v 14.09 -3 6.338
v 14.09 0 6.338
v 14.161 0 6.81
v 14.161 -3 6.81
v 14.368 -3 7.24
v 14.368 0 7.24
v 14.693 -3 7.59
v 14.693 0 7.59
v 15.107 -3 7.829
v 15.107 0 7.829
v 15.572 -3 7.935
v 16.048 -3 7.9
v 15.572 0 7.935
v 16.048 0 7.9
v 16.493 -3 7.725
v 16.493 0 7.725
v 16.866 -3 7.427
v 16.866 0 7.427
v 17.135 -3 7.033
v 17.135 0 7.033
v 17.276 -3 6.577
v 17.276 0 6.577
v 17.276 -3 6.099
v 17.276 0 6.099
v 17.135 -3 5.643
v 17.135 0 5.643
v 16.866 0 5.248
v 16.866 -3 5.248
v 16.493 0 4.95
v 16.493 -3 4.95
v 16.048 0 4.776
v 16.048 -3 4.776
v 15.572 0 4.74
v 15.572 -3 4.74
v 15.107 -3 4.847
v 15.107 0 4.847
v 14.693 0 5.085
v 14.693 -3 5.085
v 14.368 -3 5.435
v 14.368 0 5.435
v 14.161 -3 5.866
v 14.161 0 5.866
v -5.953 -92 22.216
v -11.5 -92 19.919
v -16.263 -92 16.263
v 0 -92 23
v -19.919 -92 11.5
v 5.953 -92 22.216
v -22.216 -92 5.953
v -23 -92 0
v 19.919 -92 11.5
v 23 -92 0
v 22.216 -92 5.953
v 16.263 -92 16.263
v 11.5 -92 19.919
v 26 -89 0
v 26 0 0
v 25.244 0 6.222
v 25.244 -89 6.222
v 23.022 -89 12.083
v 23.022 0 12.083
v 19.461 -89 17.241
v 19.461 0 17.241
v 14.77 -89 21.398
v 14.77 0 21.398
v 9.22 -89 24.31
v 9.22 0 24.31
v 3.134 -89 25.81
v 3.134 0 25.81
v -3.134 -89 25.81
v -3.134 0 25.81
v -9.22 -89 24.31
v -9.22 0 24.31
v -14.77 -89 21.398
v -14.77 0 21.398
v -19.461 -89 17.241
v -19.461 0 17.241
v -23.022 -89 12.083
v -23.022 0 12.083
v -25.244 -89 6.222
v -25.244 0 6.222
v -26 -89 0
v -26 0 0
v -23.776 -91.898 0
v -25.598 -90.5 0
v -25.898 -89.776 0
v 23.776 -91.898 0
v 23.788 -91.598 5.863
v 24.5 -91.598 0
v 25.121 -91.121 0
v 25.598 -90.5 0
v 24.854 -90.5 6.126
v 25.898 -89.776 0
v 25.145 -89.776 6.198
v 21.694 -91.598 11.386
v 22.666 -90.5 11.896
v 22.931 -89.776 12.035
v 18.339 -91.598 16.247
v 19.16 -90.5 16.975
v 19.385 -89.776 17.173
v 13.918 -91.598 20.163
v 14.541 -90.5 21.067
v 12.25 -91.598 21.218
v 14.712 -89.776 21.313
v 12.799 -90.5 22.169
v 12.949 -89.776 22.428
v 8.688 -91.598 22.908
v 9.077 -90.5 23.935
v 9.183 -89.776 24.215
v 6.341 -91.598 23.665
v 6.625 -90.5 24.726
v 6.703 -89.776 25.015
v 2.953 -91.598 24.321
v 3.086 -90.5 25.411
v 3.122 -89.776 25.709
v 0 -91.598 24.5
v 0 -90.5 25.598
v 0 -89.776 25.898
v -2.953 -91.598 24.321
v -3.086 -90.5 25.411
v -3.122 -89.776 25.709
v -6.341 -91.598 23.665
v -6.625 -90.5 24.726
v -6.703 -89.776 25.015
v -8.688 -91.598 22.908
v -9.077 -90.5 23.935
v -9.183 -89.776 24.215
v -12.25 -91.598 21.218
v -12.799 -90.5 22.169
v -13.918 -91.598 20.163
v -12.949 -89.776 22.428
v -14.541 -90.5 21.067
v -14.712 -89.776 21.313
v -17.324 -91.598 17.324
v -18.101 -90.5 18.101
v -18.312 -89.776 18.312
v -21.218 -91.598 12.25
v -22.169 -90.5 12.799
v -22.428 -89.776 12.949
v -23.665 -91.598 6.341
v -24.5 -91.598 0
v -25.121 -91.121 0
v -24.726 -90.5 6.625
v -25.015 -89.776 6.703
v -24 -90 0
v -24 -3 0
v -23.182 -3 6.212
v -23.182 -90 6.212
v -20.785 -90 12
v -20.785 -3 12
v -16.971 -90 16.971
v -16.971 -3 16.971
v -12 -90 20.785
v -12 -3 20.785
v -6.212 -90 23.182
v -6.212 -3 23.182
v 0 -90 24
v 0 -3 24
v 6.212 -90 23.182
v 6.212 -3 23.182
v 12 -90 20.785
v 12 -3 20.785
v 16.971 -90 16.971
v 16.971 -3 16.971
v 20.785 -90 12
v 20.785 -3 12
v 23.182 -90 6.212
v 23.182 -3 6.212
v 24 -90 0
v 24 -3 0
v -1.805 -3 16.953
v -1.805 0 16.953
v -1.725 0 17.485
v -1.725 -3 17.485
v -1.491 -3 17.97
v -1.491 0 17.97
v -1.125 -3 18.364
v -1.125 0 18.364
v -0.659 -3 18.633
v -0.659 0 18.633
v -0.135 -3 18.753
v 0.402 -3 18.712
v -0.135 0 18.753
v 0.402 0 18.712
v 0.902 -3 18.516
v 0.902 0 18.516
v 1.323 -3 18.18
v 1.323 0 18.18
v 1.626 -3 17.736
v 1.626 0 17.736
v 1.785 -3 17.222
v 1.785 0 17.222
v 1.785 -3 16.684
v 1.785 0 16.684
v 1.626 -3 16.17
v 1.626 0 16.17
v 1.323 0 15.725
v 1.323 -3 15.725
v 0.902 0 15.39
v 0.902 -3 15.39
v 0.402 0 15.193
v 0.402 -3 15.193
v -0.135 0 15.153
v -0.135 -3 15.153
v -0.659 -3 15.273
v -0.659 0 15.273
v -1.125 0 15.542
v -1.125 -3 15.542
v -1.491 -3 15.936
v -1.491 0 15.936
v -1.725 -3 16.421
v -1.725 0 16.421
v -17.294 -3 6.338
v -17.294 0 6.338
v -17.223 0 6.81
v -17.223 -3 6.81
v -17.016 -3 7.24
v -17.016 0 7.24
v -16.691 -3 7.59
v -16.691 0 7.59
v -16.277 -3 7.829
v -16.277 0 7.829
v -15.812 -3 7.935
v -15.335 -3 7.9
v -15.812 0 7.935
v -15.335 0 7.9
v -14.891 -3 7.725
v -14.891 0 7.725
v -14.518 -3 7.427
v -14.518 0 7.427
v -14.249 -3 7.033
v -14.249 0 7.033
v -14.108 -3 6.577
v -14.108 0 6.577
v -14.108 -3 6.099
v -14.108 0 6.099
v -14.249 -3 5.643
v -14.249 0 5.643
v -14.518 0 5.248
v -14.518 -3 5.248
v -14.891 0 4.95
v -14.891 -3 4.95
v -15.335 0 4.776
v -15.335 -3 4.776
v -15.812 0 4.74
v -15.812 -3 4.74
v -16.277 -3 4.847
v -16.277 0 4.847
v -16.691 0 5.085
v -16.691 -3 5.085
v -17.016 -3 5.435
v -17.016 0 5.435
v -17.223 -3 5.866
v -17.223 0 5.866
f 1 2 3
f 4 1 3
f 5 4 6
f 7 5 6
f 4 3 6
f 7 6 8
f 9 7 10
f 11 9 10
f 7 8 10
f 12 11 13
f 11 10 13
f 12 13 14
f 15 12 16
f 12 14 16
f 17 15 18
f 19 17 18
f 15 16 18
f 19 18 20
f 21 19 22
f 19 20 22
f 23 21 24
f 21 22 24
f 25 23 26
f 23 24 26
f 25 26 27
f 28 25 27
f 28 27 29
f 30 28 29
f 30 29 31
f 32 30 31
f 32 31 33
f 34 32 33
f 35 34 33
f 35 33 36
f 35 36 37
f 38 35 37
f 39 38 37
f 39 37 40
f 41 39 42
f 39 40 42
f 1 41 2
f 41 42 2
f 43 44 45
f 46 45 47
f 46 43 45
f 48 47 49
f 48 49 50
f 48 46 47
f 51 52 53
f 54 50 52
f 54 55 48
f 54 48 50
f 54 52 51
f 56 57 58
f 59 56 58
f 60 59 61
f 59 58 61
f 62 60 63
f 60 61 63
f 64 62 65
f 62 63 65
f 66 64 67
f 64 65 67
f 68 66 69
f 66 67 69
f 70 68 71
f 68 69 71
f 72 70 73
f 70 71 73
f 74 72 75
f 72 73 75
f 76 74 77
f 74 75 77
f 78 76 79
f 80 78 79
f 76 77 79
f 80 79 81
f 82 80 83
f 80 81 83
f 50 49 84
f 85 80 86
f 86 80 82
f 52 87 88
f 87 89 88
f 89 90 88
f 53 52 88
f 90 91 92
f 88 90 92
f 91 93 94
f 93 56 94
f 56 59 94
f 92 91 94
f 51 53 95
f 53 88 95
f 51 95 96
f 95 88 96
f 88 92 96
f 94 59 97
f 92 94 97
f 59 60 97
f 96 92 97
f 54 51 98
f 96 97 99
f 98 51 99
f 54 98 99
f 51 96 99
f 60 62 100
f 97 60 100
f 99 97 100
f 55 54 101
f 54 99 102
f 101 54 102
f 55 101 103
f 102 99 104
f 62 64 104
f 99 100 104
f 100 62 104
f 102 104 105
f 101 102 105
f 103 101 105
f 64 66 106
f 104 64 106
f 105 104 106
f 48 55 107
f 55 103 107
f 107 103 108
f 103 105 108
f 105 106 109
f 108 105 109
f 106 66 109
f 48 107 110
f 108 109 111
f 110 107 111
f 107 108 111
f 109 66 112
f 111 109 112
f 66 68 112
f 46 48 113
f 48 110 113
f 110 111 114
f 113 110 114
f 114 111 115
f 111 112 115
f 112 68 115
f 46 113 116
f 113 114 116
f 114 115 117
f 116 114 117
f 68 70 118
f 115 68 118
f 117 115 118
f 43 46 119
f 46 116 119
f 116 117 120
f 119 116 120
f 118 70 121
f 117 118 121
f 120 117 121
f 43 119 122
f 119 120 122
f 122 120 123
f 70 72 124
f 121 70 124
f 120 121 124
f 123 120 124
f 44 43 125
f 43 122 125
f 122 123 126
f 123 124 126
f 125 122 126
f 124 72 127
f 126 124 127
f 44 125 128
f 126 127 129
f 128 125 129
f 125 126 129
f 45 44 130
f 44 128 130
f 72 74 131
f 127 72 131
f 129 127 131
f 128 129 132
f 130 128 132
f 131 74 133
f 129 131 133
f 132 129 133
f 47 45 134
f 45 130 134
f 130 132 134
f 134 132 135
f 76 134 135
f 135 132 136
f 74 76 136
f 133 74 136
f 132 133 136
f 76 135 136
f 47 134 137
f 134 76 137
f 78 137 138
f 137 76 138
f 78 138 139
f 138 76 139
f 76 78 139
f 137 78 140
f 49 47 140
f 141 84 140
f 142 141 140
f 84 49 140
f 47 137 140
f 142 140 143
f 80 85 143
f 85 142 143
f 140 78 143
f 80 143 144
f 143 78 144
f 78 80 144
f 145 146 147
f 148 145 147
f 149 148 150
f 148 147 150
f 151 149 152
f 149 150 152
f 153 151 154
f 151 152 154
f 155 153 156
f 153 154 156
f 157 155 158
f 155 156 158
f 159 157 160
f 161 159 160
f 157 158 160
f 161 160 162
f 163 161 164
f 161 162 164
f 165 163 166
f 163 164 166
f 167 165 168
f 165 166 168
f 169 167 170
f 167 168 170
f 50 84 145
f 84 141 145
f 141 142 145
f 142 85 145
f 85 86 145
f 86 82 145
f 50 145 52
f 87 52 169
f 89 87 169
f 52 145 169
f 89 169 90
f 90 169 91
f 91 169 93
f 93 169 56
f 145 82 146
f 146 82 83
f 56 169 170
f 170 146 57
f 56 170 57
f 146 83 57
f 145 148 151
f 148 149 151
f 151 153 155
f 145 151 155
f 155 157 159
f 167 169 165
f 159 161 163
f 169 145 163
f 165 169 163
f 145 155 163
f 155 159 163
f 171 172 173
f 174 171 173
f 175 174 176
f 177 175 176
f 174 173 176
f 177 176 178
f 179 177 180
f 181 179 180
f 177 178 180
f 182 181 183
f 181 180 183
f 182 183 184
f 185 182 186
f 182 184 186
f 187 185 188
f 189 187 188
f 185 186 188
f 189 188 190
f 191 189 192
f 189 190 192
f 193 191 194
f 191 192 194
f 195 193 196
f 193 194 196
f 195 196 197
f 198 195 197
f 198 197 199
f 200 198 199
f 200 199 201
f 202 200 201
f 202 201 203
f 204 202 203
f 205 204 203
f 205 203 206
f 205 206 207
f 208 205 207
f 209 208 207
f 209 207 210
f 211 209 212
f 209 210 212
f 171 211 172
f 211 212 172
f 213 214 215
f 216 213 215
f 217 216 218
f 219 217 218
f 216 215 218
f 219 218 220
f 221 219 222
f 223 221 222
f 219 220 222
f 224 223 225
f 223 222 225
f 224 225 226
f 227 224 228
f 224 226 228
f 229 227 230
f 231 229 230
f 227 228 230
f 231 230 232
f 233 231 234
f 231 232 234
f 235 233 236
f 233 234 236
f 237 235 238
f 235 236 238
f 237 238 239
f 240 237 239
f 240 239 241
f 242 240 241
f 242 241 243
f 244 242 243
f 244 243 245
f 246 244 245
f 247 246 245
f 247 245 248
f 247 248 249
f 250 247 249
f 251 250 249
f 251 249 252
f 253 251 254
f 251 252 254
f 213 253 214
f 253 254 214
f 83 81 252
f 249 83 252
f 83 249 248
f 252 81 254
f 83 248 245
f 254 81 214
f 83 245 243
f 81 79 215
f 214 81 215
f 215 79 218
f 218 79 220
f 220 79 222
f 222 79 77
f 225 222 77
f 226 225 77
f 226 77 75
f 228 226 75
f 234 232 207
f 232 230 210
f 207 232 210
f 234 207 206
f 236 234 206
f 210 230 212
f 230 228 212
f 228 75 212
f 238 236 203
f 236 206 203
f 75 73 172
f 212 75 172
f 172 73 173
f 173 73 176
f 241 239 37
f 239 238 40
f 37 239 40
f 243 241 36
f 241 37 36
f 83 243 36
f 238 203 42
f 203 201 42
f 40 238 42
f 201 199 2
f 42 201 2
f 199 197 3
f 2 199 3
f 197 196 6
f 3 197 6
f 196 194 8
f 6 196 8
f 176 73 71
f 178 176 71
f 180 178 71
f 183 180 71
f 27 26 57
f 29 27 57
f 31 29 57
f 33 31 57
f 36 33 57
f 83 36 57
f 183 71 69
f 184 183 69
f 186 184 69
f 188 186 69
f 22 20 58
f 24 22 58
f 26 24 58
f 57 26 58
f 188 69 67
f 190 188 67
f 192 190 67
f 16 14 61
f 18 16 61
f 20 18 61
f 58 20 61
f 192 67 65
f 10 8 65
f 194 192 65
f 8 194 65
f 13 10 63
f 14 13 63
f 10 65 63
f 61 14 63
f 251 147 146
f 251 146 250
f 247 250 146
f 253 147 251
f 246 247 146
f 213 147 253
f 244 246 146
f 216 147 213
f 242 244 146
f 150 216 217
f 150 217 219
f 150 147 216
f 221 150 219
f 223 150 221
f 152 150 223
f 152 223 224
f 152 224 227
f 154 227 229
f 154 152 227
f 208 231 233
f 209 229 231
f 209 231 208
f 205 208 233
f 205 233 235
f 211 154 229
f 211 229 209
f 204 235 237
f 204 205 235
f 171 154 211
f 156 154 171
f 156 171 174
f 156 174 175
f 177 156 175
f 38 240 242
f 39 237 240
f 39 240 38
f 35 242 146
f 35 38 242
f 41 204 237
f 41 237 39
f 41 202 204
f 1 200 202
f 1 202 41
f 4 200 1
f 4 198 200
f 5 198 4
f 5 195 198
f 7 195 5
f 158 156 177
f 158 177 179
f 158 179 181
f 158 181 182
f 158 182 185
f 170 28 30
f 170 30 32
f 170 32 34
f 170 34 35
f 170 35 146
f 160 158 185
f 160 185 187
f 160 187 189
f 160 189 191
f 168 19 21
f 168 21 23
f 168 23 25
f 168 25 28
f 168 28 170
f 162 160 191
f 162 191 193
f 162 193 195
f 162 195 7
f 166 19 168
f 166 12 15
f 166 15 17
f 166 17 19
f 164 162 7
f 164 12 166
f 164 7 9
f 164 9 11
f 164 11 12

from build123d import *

# Parameters (mm, degrees)
F1_DEPTH = 90
F3_DEPTH = 2
F4_R     = 3
F6_DEPTH = 3
F7_R     = 1.804785
F7_R_2   = 1.602006
F8_DEPTH = 3


with BuildPart() as f1:
    # F0 (on Front) → F1 (new body)
    with BuildSketch(Plane.XZ):
        with BuildLine():
            Line((24, 0), (26, 0))
            ThreePointArc((26, 0), (0, 26), (-26, 0))
            Line((-26, 0), (-24, 0))
            ThreePointArc((-24, 0), (0, 24), (24, 0))
        make_face()
    extrude(amount=F1_DEPTH)

    # F2 (on face) → F3 (join)
    with BuildSketch(Plane.XZ.offset(90)):
        with BuildLine():
            Line((-26, 0), (26, 0))
            ThreePointArc((26, 0), (0, 26), (-26, 0))
        make_face()
    extrude(amount=F3_DEPTH)

    # F4
    f4_edges = [f1.edges().sort_by_distance(p)[0] for p in [
        (0, -92, 26),
    ]]
    fillet(f4_edges, radius=F4_R)

    # F5 (on Front) → F6 (join)
    with BuildSketch(Plane.XZ):
        with BuildLine():
            Line((-26, 0), (26, 0))
            ThreePointArc((26, 0), (0, 26), (-26, 0))
        make_face()
    extrude(amount=F6_DEPTH)

    # F7 (on face) → F8 (cut)
    with BuildSketch(Plane(origin=(0, 0, 0), x_dir=(-1, 0, 0), z_dir=(0, 1, 0))):
        with Locations((0, 16.952889)):
            Circle(F7_R)
        with Locations((15.691938, 6.337816)):
            Circle(F7_R_2)
        with Locations((-15.691938, 6.337816)):
            Circle(F7_R_2)
    extrude(amount=-F8_DEPTH, mode=Mode.SUBTRACT)


solid = f1.part
